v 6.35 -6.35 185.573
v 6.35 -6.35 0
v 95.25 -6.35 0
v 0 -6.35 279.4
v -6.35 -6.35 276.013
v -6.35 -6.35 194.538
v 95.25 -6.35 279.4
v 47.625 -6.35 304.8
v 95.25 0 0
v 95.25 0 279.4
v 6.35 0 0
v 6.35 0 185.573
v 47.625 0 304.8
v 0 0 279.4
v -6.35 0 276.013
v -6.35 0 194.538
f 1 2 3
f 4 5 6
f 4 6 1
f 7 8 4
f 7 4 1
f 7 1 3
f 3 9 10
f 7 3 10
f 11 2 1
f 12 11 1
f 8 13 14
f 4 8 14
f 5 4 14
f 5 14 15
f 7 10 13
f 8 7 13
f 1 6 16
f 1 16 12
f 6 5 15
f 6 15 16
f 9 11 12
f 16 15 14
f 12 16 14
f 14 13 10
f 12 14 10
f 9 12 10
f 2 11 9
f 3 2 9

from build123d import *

# Parameters (mm, degrees)
F0_W     = 95.25
F0_H     = 279.4
F1_DEPTH = 6.35
F3_DEPTH = 25.4
F5_DEPTH = 6.35
F7_DEPTH = 6.35


with BuildPart() as f1:
    # F0 (on Front) → F1 (new body)
    with BuildSketch(Plane.XZ):
        with Locations((47.625, 139.7)):
            Rectangle(F0_W, F0_H)
        Polygon((47.625, 304.8), (0, 279.4), (95.25, 279.4), align=None)
    extrude(amount=F1_DEPTH)

    # F2 (on face) → F3 (cut)
    with BuildSketch(Plane.XZ.offset(6.35)):
        Polygon((0, 0), (6.35, 0), (6.35, 177.8), (0, 182.2827526427), align=None)
    extrude(amount=-F3_DEPTH, mode=Mode.SUBTRACT)

    # F4 (on face) → F5 (cut)
    with BuildSketch(Plane.XZ.offset(6.35)):
        Polygon((0, 182.2827526427), (6.35, 177.8), (6.35, 185.5728740667), (0, 190.0556267094), align=None)
    extrude(amount=-F5_DEPTH, mode=Mode.SUBTRACT)

    # F6 (on face) → F7 (join)
    with BuildSketch(Plane.XZ.offset(6.35)):
        Polygon((0, 190.0556267094), (0, 279.4), (-6.35, 276.0133333333), (-6.35, 194.5383793521), align=None)
    extrude(amount=-F7_DEPTH)


solid = f1.part
